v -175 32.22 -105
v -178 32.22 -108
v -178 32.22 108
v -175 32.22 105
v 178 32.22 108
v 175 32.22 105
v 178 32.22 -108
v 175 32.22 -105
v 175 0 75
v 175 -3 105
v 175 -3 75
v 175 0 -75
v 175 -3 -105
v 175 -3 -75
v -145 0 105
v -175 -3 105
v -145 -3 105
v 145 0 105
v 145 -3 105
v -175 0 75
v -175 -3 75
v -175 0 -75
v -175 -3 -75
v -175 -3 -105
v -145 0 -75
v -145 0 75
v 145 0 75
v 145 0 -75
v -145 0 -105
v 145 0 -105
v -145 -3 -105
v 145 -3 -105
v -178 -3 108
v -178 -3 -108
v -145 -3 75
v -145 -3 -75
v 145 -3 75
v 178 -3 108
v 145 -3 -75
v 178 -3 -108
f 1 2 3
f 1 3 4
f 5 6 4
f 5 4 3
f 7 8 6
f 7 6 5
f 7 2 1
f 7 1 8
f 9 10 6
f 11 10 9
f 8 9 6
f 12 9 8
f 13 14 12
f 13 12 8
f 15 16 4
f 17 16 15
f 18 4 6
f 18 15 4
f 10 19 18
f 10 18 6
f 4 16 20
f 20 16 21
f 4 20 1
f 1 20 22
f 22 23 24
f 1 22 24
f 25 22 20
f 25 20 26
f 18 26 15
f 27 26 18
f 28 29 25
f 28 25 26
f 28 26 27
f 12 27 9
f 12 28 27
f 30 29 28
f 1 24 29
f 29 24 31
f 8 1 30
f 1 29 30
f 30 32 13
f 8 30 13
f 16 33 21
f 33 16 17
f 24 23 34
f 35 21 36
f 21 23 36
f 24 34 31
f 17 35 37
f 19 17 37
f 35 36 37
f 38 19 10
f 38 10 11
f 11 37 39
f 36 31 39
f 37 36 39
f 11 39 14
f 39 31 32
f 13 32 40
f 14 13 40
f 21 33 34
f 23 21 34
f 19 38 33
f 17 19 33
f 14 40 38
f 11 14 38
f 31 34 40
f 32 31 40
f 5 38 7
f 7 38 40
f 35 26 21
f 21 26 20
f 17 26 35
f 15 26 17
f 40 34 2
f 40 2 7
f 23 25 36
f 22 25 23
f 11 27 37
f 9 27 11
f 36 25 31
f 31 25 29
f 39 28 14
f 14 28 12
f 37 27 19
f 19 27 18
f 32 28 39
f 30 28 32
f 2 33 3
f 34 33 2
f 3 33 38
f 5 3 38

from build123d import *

# Parameters (mm, degrees)
SKETCH1_W               = 350
SKETCH1_H               = 210
BOSS_EXTRUDE1_DEPTH     = 32.22
SHELL1_T                = 3
SKETCH2_W               = 30
SKETCH2_H               = 30
CUT_EXTRUDE2_DEPTH      = 211.680156636
MIRROR2_COPY_1_SKETCH_W = 30
MIRROR2_COPY_1_SKETCH_H = 30
MIRROR2_COPY_1_DEPTH    = 211.680156636


with BuildPart() as part:
    # Sketch1 → Boss-Extrude1 (new body)
    with BuildSketch(Plane(origin=(0, 0, 0), x_dir=(1, 0, 0), z_dir=(0, 1, 0))):
        Rectangle(SKETCH1_W, SKETCH1_H)
    extrude(amount=BOSS_EXTRUDE1_DEPTH)

    # Shell1
    shell1_openings = [part.faces().sort_by_distance(p)[0] for p in [
        (0, 32.22, 0),
    ]]
    offset(amount=SHELL1_T, openings=shell1_openings, kind=Kind.INTERSECTION)

    # Sketch2 → Cut-Extrude2 (cut, through all)
    with BuildSketch(Plane(origin=(0, 0, 0), x_dir=(1, 0, 0), z_dir=(0, 1, 0))):
        with Locations((160, 90)):
            Rectangle(SKETCH2_W, SKETCH2_H)
    cut_extrude2 = extrude(amount=-CUT_EXTRUDE2_DEPTH, mode=Mode.SUBTRACT)

    # Mirror1: Cut-Extrude2 across plane
    add(cut_extrude2.mirror(Plane.XY), mode=Mode.SUBTRACT)

    # Mirror2: Cut-Extrude2 across plane
    add(cut_extrude2.mirror(Plane(origin=(0, 0, 0), x_dir=(0, 0, 1), z_dir=(1, 0, 0))), mode=Mode.SUBTRACT)

    # Mirror2 copy 1 sketch → Mirror2 copy 1 (cut, through all)
    with BuildSketch(Plane(origin=(0, 0, 0), x_dir=(-1, 0, 0), z_dir=(0, 1, 0))):
        with Locations((160, 90)):
            Rectangle(MIRROR2_COPY_1_SKETCH_W, MIRROR2_COPY_1_SKETCH_H)
    extrude(amount=-MIRROR2_COPY_1_DEPTH, mode=Mode.SUBTRACT)


solid = part.part
